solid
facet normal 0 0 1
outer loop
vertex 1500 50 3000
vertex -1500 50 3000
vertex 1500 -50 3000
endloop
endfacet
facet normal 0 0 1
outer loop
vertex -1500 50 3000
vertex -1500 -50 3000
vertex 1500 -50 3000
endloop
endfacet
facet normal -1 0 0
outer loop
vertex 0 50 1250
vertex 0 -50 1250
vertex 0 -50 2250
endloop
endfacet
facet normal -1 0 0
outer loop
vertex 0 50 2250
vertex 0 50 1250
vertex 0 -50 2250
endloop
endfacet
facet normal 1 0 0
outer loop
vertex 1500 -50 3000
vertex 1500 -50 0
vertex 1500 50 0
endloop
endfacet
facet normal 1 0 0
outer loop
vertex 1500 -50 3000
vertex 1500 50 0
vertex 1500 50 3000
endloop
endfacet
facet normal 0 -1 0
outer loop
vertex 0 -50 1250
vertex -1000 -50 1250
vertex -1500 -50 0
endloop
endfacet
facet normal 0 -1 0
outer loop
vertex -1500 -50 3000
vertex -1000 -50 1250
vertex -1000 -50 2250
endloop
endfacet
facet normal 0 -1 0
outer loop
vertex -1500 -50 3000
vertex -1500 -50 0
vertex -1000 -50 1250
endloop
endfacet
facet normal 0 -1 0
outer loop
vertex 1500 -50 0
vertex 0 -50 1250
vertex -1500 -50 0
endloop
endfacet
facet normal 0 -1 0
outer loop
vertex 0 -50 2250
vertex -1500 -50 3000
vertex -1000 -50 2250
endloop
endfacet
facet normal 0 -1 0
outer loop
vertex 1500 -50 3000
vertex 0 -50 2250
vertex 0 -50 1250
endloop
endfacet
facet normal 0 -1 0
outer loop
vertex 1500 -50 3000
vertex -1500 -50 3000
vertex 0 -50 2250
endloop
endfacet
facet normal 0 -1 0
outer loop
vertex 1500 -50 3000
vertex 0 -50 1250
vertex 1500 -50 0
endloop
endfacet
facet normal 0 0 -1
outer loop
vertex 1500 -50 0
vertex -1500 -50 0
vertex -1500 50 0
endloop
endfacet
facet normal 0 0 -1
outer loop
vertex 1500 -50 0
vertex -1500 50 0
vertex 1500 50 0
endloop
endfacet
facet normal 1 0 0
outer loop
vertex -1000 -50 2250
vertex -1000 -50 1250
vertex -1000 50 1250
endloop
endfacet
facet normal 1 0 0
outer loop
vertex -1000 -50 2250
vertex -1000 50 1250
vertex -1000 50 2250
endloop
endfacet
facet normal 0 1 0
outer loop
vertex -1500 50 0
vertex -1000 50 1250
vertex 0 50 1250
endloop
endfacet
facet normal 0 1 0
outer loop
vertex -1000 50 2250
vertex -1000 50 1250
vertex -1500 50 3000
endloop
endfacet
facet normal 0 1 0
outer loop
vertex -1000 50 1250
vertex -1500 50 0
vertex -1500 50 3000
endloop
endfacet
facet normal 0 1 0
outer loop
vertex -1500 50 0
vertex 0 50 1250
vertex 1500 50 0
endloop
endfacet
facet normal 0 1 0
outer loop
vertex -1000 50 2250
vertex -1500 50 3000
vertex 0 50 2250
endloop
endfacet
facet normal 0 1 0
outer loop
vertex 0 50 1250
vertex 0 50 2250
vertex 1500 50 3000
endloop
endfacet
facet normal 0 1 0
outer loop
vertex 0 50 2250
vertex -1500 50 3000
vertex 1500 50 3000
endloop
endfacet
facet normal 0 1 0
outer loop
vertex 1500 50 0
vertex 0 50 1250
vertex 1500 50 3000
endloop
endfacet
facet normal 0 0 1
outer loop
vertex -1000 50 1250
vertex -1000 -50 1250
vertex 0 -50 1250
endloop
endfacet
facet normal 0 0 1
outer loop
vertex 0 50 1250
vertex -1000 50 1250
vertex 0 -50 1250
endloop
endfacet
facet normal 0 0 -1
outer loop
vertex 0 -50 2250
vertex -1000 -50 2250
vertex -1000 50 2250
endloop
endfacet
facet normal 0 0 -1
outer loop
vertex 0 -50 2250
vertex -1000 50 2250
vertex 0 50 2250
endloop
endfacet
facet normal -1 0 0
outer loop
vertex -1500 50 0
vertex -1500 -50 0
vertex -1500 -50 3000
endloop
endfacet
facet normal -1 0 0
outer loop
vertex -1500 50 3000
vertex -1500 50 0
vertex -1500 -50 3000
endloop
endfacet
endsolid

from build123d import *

# Parameters (mm, degrees)
F0_W     = 3000
F0_H     = 3000
F1_DEPTH = 50
F2_W     = 1000
F2_H     = 1000
F3_DEPTH = 100.001


with BuildPart() as f1:
    # F0 (on Front) → F1 (new body, symmetric)
    with BuildSketch(Plane.XZ):
        with Locations((0, 1500)):
            Rectangle(F0_W, F0_H)
    extrude(amount=F1_DEPTH, both=True)

    # F2 (on face) → F3 (cut, through all)
    with BuildSketch(Plane.XZ.offset(50)):
        with Locations((-500, 1750)):
            Rectangle(F2_W, F2_H)
    extrude(amount=-F3_DEPTH, mode=Mode.SUBTRACT)


solid = f1.part
